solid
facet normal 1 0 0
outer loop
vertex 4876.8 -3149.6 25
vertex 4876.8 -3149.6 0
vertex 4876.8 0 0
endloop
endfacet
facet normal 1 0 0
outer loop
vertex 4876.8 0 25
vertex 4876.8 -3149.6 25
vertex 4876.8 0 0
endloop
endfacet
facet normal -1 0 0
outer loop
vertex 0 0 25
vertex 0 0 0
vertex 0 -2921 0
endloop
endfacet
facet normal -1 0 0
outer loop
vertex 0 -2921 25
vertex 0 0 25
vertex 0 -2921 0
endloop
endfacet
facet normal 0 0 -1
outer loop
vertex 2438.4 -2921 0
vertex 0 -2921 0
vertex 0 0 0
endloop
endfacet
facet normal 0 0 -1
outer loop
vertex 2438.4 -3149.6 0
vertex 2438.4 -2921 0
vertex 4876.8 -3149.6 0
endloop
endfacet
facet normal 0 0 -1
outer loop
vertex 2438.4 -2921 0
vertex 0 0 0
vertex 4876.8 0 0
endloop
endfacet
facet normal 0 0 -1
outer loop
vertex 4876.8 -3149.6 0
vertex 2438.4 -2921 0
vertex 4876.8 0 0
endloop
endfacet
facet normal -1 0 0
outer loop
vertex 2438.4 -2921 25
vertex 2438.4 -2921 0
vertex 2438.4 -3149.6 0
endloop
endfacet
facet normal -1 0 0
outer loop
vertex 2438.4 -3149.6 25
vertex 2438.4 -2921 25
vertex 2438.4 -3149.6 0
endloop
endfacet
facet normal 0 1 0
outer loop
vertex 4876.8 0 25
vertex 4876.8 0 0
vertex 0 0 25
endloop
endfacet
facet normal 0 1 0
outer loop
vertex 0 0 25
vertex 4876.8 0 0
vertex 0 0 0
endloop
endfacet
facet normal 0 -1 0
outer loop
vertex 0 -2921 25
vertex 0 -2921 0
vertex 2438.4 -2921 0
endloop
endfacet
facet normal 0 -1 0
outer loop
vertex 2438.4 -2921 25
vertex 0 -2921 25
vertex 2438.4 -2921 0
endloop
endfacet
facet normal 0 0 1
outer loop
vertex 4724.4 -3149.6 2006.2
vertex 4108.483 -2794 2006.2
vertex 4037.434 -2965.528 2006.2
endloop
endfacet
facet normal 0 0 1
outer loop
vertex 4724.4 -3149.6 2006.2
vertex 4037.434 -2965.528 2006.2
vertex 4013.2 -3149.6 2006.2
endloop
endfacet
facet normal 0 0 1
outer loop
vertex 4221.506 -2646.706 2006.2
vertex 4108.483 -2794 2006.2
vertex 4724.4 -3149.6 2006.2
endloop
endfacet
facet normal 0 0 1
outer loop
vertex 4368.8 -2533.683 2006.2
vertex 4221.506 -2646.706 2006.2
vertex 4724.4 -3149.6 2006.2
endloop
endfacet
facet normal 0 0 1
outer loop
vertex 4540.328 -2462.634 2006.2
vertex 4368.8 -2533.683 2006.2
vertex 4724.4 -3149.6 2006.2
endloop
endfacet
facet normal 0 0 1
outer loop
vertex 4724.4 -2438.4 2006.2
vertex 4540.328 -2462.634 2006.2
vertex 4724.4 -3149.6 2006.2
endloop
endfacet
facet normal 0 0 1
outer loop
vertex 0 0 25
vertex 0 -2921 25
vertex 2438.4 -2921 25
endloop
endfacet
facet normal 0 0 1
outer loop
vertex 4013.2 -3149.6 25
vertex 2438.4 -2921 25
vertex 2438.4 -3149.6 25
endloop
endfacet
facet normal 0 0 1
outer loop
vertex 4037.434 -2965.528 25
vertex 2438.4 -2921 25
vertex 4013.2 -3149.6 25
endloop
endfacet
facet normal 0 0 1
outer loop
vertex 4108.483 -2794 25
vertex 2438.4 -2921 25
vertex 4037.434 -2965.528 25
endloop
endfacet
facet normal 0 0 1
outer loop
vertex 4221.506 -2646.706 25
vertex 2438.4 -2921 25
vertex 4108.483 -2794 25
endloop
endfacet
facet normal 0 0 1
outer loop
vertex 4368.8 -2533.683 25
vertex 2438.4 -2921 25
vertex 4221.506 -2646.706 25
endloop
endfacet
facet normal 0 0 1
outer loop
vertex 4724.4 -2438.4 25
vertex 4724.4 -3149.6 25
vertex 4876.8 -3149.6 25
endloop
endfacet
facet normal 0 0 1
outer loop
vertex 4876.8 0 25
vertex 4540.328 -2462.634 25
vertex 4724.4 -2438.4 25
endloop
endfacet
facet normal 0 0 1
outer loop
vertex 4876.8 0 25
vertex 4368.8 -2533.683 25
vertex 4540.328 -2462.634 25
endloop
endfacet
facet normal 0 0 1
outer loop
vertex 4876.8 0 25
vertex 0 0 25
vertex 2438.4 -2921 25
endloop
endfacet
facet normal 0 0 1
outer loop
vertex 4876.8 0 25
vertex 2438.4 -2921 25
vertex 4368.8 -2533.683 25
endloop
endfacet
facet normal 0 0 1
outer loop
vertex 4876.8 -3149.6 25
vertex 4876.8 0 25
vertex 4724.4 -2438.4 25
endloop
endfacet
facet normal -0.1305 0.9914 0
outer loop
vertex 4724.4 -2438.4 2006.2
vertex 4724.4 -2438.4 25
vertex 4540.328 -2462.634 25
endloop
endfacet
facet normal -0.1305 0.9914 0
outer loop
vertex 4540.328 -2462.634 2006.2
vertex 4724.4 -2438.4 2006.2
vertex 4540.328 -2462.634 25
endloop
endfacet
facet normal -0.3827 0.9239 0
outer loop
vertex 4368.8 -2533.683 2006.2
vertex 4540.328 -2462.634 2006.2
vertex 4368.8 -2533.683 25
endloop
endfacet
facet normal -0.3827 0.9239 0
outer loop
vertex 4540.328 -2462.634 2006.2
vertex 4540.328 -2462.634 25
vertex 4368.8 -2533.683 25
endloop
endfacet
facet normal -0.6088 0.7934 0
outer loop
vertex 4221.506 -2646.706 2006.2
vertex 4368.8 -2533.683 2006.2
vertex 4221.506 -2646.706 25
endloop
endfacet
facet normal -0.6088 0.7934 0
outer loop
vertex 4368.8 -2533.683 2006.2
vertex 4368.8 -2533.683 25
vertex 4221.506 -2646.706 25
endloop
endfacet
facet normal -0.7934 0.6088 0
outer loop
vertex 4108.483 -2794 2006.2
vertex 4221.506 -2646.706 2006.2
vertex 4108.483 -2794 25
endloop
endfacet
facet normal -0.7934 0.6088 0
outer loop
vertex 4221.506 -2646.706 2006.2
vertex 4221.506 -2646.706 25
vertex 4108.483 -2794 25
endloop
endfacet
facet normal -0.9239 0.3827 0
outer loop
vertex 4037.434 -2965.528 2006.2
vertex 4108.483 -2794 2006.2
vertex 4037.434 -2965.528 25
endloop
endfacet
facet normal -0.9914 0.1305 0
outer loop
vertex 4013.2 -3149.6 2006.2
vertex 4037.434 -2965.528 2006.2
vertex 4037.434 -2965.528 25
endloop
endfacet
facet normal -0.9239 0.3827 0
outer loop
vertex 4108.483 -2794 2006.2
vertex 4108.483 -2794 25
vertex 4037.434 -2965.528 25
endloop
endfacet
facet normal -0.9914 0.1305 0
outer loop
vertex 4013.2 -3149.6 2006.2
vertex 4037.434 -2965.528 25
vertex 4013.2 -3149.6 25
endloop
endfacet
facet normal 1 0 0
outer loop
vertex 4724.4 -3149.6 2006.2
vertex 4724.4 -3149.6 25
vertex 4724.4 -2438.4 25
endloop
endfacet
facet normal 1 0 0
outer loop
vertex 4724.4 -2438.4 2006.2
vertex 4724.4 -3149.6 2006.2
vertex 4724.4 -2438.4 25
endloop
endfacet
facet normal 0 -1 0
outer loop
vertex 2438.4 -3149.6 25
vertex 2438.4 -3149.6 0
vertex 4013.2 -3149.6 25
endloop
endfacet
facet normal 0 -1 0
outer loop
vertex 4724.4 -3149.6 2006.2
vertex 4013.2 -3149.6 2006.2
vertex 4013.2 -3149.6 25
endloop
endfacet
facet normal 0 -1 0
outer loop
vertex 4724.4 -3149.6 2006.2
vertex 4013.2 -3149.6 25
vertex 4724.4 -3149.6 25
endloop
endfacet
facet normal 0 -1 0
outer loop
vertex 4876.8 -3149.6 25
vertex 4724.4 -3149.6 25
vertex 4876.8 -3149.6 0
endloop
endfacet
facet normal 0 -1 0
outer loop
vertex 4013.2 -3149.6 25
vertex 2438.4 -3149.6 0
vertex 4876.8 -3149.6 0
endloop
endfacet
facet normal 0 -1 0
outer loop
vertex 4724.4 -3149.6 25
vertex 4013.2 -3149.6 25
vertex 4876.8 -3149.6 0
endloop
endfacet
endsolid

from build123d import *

# Parameters (mm, degrees)
F1_DEPTH = 25
F3_DEPTH = 1981.2


with BuildPart() as f1:
    # F0 (on Top) → F1 (new body)
    with BuildSketch(Plane.XY):
        Polygon((4876.8, 0), (0, 0), (0, -2921), (2438.4, -2921), (2438.4, -3149.6), (4876.8, -3149.6), align=None)
    extrude(amount=F1_DEPTH)

    # F2 (on face) → F3 (join)
    with BuildSketch(Plane.XY.offset(25)):
        with BuildLine():
            Line((4013.2, -3149.6), (4724.4, -3149.6))
            Line((4724.4, -3149.6), (4724.4, -2438.4))
            ThreePointArc((4724.4, -2438.4), (4221.505657, -2646.705657), (4013.2, -3149.6))
        make_face()
    extrude(amount=F3_DEPTH)


solid = f1.part
